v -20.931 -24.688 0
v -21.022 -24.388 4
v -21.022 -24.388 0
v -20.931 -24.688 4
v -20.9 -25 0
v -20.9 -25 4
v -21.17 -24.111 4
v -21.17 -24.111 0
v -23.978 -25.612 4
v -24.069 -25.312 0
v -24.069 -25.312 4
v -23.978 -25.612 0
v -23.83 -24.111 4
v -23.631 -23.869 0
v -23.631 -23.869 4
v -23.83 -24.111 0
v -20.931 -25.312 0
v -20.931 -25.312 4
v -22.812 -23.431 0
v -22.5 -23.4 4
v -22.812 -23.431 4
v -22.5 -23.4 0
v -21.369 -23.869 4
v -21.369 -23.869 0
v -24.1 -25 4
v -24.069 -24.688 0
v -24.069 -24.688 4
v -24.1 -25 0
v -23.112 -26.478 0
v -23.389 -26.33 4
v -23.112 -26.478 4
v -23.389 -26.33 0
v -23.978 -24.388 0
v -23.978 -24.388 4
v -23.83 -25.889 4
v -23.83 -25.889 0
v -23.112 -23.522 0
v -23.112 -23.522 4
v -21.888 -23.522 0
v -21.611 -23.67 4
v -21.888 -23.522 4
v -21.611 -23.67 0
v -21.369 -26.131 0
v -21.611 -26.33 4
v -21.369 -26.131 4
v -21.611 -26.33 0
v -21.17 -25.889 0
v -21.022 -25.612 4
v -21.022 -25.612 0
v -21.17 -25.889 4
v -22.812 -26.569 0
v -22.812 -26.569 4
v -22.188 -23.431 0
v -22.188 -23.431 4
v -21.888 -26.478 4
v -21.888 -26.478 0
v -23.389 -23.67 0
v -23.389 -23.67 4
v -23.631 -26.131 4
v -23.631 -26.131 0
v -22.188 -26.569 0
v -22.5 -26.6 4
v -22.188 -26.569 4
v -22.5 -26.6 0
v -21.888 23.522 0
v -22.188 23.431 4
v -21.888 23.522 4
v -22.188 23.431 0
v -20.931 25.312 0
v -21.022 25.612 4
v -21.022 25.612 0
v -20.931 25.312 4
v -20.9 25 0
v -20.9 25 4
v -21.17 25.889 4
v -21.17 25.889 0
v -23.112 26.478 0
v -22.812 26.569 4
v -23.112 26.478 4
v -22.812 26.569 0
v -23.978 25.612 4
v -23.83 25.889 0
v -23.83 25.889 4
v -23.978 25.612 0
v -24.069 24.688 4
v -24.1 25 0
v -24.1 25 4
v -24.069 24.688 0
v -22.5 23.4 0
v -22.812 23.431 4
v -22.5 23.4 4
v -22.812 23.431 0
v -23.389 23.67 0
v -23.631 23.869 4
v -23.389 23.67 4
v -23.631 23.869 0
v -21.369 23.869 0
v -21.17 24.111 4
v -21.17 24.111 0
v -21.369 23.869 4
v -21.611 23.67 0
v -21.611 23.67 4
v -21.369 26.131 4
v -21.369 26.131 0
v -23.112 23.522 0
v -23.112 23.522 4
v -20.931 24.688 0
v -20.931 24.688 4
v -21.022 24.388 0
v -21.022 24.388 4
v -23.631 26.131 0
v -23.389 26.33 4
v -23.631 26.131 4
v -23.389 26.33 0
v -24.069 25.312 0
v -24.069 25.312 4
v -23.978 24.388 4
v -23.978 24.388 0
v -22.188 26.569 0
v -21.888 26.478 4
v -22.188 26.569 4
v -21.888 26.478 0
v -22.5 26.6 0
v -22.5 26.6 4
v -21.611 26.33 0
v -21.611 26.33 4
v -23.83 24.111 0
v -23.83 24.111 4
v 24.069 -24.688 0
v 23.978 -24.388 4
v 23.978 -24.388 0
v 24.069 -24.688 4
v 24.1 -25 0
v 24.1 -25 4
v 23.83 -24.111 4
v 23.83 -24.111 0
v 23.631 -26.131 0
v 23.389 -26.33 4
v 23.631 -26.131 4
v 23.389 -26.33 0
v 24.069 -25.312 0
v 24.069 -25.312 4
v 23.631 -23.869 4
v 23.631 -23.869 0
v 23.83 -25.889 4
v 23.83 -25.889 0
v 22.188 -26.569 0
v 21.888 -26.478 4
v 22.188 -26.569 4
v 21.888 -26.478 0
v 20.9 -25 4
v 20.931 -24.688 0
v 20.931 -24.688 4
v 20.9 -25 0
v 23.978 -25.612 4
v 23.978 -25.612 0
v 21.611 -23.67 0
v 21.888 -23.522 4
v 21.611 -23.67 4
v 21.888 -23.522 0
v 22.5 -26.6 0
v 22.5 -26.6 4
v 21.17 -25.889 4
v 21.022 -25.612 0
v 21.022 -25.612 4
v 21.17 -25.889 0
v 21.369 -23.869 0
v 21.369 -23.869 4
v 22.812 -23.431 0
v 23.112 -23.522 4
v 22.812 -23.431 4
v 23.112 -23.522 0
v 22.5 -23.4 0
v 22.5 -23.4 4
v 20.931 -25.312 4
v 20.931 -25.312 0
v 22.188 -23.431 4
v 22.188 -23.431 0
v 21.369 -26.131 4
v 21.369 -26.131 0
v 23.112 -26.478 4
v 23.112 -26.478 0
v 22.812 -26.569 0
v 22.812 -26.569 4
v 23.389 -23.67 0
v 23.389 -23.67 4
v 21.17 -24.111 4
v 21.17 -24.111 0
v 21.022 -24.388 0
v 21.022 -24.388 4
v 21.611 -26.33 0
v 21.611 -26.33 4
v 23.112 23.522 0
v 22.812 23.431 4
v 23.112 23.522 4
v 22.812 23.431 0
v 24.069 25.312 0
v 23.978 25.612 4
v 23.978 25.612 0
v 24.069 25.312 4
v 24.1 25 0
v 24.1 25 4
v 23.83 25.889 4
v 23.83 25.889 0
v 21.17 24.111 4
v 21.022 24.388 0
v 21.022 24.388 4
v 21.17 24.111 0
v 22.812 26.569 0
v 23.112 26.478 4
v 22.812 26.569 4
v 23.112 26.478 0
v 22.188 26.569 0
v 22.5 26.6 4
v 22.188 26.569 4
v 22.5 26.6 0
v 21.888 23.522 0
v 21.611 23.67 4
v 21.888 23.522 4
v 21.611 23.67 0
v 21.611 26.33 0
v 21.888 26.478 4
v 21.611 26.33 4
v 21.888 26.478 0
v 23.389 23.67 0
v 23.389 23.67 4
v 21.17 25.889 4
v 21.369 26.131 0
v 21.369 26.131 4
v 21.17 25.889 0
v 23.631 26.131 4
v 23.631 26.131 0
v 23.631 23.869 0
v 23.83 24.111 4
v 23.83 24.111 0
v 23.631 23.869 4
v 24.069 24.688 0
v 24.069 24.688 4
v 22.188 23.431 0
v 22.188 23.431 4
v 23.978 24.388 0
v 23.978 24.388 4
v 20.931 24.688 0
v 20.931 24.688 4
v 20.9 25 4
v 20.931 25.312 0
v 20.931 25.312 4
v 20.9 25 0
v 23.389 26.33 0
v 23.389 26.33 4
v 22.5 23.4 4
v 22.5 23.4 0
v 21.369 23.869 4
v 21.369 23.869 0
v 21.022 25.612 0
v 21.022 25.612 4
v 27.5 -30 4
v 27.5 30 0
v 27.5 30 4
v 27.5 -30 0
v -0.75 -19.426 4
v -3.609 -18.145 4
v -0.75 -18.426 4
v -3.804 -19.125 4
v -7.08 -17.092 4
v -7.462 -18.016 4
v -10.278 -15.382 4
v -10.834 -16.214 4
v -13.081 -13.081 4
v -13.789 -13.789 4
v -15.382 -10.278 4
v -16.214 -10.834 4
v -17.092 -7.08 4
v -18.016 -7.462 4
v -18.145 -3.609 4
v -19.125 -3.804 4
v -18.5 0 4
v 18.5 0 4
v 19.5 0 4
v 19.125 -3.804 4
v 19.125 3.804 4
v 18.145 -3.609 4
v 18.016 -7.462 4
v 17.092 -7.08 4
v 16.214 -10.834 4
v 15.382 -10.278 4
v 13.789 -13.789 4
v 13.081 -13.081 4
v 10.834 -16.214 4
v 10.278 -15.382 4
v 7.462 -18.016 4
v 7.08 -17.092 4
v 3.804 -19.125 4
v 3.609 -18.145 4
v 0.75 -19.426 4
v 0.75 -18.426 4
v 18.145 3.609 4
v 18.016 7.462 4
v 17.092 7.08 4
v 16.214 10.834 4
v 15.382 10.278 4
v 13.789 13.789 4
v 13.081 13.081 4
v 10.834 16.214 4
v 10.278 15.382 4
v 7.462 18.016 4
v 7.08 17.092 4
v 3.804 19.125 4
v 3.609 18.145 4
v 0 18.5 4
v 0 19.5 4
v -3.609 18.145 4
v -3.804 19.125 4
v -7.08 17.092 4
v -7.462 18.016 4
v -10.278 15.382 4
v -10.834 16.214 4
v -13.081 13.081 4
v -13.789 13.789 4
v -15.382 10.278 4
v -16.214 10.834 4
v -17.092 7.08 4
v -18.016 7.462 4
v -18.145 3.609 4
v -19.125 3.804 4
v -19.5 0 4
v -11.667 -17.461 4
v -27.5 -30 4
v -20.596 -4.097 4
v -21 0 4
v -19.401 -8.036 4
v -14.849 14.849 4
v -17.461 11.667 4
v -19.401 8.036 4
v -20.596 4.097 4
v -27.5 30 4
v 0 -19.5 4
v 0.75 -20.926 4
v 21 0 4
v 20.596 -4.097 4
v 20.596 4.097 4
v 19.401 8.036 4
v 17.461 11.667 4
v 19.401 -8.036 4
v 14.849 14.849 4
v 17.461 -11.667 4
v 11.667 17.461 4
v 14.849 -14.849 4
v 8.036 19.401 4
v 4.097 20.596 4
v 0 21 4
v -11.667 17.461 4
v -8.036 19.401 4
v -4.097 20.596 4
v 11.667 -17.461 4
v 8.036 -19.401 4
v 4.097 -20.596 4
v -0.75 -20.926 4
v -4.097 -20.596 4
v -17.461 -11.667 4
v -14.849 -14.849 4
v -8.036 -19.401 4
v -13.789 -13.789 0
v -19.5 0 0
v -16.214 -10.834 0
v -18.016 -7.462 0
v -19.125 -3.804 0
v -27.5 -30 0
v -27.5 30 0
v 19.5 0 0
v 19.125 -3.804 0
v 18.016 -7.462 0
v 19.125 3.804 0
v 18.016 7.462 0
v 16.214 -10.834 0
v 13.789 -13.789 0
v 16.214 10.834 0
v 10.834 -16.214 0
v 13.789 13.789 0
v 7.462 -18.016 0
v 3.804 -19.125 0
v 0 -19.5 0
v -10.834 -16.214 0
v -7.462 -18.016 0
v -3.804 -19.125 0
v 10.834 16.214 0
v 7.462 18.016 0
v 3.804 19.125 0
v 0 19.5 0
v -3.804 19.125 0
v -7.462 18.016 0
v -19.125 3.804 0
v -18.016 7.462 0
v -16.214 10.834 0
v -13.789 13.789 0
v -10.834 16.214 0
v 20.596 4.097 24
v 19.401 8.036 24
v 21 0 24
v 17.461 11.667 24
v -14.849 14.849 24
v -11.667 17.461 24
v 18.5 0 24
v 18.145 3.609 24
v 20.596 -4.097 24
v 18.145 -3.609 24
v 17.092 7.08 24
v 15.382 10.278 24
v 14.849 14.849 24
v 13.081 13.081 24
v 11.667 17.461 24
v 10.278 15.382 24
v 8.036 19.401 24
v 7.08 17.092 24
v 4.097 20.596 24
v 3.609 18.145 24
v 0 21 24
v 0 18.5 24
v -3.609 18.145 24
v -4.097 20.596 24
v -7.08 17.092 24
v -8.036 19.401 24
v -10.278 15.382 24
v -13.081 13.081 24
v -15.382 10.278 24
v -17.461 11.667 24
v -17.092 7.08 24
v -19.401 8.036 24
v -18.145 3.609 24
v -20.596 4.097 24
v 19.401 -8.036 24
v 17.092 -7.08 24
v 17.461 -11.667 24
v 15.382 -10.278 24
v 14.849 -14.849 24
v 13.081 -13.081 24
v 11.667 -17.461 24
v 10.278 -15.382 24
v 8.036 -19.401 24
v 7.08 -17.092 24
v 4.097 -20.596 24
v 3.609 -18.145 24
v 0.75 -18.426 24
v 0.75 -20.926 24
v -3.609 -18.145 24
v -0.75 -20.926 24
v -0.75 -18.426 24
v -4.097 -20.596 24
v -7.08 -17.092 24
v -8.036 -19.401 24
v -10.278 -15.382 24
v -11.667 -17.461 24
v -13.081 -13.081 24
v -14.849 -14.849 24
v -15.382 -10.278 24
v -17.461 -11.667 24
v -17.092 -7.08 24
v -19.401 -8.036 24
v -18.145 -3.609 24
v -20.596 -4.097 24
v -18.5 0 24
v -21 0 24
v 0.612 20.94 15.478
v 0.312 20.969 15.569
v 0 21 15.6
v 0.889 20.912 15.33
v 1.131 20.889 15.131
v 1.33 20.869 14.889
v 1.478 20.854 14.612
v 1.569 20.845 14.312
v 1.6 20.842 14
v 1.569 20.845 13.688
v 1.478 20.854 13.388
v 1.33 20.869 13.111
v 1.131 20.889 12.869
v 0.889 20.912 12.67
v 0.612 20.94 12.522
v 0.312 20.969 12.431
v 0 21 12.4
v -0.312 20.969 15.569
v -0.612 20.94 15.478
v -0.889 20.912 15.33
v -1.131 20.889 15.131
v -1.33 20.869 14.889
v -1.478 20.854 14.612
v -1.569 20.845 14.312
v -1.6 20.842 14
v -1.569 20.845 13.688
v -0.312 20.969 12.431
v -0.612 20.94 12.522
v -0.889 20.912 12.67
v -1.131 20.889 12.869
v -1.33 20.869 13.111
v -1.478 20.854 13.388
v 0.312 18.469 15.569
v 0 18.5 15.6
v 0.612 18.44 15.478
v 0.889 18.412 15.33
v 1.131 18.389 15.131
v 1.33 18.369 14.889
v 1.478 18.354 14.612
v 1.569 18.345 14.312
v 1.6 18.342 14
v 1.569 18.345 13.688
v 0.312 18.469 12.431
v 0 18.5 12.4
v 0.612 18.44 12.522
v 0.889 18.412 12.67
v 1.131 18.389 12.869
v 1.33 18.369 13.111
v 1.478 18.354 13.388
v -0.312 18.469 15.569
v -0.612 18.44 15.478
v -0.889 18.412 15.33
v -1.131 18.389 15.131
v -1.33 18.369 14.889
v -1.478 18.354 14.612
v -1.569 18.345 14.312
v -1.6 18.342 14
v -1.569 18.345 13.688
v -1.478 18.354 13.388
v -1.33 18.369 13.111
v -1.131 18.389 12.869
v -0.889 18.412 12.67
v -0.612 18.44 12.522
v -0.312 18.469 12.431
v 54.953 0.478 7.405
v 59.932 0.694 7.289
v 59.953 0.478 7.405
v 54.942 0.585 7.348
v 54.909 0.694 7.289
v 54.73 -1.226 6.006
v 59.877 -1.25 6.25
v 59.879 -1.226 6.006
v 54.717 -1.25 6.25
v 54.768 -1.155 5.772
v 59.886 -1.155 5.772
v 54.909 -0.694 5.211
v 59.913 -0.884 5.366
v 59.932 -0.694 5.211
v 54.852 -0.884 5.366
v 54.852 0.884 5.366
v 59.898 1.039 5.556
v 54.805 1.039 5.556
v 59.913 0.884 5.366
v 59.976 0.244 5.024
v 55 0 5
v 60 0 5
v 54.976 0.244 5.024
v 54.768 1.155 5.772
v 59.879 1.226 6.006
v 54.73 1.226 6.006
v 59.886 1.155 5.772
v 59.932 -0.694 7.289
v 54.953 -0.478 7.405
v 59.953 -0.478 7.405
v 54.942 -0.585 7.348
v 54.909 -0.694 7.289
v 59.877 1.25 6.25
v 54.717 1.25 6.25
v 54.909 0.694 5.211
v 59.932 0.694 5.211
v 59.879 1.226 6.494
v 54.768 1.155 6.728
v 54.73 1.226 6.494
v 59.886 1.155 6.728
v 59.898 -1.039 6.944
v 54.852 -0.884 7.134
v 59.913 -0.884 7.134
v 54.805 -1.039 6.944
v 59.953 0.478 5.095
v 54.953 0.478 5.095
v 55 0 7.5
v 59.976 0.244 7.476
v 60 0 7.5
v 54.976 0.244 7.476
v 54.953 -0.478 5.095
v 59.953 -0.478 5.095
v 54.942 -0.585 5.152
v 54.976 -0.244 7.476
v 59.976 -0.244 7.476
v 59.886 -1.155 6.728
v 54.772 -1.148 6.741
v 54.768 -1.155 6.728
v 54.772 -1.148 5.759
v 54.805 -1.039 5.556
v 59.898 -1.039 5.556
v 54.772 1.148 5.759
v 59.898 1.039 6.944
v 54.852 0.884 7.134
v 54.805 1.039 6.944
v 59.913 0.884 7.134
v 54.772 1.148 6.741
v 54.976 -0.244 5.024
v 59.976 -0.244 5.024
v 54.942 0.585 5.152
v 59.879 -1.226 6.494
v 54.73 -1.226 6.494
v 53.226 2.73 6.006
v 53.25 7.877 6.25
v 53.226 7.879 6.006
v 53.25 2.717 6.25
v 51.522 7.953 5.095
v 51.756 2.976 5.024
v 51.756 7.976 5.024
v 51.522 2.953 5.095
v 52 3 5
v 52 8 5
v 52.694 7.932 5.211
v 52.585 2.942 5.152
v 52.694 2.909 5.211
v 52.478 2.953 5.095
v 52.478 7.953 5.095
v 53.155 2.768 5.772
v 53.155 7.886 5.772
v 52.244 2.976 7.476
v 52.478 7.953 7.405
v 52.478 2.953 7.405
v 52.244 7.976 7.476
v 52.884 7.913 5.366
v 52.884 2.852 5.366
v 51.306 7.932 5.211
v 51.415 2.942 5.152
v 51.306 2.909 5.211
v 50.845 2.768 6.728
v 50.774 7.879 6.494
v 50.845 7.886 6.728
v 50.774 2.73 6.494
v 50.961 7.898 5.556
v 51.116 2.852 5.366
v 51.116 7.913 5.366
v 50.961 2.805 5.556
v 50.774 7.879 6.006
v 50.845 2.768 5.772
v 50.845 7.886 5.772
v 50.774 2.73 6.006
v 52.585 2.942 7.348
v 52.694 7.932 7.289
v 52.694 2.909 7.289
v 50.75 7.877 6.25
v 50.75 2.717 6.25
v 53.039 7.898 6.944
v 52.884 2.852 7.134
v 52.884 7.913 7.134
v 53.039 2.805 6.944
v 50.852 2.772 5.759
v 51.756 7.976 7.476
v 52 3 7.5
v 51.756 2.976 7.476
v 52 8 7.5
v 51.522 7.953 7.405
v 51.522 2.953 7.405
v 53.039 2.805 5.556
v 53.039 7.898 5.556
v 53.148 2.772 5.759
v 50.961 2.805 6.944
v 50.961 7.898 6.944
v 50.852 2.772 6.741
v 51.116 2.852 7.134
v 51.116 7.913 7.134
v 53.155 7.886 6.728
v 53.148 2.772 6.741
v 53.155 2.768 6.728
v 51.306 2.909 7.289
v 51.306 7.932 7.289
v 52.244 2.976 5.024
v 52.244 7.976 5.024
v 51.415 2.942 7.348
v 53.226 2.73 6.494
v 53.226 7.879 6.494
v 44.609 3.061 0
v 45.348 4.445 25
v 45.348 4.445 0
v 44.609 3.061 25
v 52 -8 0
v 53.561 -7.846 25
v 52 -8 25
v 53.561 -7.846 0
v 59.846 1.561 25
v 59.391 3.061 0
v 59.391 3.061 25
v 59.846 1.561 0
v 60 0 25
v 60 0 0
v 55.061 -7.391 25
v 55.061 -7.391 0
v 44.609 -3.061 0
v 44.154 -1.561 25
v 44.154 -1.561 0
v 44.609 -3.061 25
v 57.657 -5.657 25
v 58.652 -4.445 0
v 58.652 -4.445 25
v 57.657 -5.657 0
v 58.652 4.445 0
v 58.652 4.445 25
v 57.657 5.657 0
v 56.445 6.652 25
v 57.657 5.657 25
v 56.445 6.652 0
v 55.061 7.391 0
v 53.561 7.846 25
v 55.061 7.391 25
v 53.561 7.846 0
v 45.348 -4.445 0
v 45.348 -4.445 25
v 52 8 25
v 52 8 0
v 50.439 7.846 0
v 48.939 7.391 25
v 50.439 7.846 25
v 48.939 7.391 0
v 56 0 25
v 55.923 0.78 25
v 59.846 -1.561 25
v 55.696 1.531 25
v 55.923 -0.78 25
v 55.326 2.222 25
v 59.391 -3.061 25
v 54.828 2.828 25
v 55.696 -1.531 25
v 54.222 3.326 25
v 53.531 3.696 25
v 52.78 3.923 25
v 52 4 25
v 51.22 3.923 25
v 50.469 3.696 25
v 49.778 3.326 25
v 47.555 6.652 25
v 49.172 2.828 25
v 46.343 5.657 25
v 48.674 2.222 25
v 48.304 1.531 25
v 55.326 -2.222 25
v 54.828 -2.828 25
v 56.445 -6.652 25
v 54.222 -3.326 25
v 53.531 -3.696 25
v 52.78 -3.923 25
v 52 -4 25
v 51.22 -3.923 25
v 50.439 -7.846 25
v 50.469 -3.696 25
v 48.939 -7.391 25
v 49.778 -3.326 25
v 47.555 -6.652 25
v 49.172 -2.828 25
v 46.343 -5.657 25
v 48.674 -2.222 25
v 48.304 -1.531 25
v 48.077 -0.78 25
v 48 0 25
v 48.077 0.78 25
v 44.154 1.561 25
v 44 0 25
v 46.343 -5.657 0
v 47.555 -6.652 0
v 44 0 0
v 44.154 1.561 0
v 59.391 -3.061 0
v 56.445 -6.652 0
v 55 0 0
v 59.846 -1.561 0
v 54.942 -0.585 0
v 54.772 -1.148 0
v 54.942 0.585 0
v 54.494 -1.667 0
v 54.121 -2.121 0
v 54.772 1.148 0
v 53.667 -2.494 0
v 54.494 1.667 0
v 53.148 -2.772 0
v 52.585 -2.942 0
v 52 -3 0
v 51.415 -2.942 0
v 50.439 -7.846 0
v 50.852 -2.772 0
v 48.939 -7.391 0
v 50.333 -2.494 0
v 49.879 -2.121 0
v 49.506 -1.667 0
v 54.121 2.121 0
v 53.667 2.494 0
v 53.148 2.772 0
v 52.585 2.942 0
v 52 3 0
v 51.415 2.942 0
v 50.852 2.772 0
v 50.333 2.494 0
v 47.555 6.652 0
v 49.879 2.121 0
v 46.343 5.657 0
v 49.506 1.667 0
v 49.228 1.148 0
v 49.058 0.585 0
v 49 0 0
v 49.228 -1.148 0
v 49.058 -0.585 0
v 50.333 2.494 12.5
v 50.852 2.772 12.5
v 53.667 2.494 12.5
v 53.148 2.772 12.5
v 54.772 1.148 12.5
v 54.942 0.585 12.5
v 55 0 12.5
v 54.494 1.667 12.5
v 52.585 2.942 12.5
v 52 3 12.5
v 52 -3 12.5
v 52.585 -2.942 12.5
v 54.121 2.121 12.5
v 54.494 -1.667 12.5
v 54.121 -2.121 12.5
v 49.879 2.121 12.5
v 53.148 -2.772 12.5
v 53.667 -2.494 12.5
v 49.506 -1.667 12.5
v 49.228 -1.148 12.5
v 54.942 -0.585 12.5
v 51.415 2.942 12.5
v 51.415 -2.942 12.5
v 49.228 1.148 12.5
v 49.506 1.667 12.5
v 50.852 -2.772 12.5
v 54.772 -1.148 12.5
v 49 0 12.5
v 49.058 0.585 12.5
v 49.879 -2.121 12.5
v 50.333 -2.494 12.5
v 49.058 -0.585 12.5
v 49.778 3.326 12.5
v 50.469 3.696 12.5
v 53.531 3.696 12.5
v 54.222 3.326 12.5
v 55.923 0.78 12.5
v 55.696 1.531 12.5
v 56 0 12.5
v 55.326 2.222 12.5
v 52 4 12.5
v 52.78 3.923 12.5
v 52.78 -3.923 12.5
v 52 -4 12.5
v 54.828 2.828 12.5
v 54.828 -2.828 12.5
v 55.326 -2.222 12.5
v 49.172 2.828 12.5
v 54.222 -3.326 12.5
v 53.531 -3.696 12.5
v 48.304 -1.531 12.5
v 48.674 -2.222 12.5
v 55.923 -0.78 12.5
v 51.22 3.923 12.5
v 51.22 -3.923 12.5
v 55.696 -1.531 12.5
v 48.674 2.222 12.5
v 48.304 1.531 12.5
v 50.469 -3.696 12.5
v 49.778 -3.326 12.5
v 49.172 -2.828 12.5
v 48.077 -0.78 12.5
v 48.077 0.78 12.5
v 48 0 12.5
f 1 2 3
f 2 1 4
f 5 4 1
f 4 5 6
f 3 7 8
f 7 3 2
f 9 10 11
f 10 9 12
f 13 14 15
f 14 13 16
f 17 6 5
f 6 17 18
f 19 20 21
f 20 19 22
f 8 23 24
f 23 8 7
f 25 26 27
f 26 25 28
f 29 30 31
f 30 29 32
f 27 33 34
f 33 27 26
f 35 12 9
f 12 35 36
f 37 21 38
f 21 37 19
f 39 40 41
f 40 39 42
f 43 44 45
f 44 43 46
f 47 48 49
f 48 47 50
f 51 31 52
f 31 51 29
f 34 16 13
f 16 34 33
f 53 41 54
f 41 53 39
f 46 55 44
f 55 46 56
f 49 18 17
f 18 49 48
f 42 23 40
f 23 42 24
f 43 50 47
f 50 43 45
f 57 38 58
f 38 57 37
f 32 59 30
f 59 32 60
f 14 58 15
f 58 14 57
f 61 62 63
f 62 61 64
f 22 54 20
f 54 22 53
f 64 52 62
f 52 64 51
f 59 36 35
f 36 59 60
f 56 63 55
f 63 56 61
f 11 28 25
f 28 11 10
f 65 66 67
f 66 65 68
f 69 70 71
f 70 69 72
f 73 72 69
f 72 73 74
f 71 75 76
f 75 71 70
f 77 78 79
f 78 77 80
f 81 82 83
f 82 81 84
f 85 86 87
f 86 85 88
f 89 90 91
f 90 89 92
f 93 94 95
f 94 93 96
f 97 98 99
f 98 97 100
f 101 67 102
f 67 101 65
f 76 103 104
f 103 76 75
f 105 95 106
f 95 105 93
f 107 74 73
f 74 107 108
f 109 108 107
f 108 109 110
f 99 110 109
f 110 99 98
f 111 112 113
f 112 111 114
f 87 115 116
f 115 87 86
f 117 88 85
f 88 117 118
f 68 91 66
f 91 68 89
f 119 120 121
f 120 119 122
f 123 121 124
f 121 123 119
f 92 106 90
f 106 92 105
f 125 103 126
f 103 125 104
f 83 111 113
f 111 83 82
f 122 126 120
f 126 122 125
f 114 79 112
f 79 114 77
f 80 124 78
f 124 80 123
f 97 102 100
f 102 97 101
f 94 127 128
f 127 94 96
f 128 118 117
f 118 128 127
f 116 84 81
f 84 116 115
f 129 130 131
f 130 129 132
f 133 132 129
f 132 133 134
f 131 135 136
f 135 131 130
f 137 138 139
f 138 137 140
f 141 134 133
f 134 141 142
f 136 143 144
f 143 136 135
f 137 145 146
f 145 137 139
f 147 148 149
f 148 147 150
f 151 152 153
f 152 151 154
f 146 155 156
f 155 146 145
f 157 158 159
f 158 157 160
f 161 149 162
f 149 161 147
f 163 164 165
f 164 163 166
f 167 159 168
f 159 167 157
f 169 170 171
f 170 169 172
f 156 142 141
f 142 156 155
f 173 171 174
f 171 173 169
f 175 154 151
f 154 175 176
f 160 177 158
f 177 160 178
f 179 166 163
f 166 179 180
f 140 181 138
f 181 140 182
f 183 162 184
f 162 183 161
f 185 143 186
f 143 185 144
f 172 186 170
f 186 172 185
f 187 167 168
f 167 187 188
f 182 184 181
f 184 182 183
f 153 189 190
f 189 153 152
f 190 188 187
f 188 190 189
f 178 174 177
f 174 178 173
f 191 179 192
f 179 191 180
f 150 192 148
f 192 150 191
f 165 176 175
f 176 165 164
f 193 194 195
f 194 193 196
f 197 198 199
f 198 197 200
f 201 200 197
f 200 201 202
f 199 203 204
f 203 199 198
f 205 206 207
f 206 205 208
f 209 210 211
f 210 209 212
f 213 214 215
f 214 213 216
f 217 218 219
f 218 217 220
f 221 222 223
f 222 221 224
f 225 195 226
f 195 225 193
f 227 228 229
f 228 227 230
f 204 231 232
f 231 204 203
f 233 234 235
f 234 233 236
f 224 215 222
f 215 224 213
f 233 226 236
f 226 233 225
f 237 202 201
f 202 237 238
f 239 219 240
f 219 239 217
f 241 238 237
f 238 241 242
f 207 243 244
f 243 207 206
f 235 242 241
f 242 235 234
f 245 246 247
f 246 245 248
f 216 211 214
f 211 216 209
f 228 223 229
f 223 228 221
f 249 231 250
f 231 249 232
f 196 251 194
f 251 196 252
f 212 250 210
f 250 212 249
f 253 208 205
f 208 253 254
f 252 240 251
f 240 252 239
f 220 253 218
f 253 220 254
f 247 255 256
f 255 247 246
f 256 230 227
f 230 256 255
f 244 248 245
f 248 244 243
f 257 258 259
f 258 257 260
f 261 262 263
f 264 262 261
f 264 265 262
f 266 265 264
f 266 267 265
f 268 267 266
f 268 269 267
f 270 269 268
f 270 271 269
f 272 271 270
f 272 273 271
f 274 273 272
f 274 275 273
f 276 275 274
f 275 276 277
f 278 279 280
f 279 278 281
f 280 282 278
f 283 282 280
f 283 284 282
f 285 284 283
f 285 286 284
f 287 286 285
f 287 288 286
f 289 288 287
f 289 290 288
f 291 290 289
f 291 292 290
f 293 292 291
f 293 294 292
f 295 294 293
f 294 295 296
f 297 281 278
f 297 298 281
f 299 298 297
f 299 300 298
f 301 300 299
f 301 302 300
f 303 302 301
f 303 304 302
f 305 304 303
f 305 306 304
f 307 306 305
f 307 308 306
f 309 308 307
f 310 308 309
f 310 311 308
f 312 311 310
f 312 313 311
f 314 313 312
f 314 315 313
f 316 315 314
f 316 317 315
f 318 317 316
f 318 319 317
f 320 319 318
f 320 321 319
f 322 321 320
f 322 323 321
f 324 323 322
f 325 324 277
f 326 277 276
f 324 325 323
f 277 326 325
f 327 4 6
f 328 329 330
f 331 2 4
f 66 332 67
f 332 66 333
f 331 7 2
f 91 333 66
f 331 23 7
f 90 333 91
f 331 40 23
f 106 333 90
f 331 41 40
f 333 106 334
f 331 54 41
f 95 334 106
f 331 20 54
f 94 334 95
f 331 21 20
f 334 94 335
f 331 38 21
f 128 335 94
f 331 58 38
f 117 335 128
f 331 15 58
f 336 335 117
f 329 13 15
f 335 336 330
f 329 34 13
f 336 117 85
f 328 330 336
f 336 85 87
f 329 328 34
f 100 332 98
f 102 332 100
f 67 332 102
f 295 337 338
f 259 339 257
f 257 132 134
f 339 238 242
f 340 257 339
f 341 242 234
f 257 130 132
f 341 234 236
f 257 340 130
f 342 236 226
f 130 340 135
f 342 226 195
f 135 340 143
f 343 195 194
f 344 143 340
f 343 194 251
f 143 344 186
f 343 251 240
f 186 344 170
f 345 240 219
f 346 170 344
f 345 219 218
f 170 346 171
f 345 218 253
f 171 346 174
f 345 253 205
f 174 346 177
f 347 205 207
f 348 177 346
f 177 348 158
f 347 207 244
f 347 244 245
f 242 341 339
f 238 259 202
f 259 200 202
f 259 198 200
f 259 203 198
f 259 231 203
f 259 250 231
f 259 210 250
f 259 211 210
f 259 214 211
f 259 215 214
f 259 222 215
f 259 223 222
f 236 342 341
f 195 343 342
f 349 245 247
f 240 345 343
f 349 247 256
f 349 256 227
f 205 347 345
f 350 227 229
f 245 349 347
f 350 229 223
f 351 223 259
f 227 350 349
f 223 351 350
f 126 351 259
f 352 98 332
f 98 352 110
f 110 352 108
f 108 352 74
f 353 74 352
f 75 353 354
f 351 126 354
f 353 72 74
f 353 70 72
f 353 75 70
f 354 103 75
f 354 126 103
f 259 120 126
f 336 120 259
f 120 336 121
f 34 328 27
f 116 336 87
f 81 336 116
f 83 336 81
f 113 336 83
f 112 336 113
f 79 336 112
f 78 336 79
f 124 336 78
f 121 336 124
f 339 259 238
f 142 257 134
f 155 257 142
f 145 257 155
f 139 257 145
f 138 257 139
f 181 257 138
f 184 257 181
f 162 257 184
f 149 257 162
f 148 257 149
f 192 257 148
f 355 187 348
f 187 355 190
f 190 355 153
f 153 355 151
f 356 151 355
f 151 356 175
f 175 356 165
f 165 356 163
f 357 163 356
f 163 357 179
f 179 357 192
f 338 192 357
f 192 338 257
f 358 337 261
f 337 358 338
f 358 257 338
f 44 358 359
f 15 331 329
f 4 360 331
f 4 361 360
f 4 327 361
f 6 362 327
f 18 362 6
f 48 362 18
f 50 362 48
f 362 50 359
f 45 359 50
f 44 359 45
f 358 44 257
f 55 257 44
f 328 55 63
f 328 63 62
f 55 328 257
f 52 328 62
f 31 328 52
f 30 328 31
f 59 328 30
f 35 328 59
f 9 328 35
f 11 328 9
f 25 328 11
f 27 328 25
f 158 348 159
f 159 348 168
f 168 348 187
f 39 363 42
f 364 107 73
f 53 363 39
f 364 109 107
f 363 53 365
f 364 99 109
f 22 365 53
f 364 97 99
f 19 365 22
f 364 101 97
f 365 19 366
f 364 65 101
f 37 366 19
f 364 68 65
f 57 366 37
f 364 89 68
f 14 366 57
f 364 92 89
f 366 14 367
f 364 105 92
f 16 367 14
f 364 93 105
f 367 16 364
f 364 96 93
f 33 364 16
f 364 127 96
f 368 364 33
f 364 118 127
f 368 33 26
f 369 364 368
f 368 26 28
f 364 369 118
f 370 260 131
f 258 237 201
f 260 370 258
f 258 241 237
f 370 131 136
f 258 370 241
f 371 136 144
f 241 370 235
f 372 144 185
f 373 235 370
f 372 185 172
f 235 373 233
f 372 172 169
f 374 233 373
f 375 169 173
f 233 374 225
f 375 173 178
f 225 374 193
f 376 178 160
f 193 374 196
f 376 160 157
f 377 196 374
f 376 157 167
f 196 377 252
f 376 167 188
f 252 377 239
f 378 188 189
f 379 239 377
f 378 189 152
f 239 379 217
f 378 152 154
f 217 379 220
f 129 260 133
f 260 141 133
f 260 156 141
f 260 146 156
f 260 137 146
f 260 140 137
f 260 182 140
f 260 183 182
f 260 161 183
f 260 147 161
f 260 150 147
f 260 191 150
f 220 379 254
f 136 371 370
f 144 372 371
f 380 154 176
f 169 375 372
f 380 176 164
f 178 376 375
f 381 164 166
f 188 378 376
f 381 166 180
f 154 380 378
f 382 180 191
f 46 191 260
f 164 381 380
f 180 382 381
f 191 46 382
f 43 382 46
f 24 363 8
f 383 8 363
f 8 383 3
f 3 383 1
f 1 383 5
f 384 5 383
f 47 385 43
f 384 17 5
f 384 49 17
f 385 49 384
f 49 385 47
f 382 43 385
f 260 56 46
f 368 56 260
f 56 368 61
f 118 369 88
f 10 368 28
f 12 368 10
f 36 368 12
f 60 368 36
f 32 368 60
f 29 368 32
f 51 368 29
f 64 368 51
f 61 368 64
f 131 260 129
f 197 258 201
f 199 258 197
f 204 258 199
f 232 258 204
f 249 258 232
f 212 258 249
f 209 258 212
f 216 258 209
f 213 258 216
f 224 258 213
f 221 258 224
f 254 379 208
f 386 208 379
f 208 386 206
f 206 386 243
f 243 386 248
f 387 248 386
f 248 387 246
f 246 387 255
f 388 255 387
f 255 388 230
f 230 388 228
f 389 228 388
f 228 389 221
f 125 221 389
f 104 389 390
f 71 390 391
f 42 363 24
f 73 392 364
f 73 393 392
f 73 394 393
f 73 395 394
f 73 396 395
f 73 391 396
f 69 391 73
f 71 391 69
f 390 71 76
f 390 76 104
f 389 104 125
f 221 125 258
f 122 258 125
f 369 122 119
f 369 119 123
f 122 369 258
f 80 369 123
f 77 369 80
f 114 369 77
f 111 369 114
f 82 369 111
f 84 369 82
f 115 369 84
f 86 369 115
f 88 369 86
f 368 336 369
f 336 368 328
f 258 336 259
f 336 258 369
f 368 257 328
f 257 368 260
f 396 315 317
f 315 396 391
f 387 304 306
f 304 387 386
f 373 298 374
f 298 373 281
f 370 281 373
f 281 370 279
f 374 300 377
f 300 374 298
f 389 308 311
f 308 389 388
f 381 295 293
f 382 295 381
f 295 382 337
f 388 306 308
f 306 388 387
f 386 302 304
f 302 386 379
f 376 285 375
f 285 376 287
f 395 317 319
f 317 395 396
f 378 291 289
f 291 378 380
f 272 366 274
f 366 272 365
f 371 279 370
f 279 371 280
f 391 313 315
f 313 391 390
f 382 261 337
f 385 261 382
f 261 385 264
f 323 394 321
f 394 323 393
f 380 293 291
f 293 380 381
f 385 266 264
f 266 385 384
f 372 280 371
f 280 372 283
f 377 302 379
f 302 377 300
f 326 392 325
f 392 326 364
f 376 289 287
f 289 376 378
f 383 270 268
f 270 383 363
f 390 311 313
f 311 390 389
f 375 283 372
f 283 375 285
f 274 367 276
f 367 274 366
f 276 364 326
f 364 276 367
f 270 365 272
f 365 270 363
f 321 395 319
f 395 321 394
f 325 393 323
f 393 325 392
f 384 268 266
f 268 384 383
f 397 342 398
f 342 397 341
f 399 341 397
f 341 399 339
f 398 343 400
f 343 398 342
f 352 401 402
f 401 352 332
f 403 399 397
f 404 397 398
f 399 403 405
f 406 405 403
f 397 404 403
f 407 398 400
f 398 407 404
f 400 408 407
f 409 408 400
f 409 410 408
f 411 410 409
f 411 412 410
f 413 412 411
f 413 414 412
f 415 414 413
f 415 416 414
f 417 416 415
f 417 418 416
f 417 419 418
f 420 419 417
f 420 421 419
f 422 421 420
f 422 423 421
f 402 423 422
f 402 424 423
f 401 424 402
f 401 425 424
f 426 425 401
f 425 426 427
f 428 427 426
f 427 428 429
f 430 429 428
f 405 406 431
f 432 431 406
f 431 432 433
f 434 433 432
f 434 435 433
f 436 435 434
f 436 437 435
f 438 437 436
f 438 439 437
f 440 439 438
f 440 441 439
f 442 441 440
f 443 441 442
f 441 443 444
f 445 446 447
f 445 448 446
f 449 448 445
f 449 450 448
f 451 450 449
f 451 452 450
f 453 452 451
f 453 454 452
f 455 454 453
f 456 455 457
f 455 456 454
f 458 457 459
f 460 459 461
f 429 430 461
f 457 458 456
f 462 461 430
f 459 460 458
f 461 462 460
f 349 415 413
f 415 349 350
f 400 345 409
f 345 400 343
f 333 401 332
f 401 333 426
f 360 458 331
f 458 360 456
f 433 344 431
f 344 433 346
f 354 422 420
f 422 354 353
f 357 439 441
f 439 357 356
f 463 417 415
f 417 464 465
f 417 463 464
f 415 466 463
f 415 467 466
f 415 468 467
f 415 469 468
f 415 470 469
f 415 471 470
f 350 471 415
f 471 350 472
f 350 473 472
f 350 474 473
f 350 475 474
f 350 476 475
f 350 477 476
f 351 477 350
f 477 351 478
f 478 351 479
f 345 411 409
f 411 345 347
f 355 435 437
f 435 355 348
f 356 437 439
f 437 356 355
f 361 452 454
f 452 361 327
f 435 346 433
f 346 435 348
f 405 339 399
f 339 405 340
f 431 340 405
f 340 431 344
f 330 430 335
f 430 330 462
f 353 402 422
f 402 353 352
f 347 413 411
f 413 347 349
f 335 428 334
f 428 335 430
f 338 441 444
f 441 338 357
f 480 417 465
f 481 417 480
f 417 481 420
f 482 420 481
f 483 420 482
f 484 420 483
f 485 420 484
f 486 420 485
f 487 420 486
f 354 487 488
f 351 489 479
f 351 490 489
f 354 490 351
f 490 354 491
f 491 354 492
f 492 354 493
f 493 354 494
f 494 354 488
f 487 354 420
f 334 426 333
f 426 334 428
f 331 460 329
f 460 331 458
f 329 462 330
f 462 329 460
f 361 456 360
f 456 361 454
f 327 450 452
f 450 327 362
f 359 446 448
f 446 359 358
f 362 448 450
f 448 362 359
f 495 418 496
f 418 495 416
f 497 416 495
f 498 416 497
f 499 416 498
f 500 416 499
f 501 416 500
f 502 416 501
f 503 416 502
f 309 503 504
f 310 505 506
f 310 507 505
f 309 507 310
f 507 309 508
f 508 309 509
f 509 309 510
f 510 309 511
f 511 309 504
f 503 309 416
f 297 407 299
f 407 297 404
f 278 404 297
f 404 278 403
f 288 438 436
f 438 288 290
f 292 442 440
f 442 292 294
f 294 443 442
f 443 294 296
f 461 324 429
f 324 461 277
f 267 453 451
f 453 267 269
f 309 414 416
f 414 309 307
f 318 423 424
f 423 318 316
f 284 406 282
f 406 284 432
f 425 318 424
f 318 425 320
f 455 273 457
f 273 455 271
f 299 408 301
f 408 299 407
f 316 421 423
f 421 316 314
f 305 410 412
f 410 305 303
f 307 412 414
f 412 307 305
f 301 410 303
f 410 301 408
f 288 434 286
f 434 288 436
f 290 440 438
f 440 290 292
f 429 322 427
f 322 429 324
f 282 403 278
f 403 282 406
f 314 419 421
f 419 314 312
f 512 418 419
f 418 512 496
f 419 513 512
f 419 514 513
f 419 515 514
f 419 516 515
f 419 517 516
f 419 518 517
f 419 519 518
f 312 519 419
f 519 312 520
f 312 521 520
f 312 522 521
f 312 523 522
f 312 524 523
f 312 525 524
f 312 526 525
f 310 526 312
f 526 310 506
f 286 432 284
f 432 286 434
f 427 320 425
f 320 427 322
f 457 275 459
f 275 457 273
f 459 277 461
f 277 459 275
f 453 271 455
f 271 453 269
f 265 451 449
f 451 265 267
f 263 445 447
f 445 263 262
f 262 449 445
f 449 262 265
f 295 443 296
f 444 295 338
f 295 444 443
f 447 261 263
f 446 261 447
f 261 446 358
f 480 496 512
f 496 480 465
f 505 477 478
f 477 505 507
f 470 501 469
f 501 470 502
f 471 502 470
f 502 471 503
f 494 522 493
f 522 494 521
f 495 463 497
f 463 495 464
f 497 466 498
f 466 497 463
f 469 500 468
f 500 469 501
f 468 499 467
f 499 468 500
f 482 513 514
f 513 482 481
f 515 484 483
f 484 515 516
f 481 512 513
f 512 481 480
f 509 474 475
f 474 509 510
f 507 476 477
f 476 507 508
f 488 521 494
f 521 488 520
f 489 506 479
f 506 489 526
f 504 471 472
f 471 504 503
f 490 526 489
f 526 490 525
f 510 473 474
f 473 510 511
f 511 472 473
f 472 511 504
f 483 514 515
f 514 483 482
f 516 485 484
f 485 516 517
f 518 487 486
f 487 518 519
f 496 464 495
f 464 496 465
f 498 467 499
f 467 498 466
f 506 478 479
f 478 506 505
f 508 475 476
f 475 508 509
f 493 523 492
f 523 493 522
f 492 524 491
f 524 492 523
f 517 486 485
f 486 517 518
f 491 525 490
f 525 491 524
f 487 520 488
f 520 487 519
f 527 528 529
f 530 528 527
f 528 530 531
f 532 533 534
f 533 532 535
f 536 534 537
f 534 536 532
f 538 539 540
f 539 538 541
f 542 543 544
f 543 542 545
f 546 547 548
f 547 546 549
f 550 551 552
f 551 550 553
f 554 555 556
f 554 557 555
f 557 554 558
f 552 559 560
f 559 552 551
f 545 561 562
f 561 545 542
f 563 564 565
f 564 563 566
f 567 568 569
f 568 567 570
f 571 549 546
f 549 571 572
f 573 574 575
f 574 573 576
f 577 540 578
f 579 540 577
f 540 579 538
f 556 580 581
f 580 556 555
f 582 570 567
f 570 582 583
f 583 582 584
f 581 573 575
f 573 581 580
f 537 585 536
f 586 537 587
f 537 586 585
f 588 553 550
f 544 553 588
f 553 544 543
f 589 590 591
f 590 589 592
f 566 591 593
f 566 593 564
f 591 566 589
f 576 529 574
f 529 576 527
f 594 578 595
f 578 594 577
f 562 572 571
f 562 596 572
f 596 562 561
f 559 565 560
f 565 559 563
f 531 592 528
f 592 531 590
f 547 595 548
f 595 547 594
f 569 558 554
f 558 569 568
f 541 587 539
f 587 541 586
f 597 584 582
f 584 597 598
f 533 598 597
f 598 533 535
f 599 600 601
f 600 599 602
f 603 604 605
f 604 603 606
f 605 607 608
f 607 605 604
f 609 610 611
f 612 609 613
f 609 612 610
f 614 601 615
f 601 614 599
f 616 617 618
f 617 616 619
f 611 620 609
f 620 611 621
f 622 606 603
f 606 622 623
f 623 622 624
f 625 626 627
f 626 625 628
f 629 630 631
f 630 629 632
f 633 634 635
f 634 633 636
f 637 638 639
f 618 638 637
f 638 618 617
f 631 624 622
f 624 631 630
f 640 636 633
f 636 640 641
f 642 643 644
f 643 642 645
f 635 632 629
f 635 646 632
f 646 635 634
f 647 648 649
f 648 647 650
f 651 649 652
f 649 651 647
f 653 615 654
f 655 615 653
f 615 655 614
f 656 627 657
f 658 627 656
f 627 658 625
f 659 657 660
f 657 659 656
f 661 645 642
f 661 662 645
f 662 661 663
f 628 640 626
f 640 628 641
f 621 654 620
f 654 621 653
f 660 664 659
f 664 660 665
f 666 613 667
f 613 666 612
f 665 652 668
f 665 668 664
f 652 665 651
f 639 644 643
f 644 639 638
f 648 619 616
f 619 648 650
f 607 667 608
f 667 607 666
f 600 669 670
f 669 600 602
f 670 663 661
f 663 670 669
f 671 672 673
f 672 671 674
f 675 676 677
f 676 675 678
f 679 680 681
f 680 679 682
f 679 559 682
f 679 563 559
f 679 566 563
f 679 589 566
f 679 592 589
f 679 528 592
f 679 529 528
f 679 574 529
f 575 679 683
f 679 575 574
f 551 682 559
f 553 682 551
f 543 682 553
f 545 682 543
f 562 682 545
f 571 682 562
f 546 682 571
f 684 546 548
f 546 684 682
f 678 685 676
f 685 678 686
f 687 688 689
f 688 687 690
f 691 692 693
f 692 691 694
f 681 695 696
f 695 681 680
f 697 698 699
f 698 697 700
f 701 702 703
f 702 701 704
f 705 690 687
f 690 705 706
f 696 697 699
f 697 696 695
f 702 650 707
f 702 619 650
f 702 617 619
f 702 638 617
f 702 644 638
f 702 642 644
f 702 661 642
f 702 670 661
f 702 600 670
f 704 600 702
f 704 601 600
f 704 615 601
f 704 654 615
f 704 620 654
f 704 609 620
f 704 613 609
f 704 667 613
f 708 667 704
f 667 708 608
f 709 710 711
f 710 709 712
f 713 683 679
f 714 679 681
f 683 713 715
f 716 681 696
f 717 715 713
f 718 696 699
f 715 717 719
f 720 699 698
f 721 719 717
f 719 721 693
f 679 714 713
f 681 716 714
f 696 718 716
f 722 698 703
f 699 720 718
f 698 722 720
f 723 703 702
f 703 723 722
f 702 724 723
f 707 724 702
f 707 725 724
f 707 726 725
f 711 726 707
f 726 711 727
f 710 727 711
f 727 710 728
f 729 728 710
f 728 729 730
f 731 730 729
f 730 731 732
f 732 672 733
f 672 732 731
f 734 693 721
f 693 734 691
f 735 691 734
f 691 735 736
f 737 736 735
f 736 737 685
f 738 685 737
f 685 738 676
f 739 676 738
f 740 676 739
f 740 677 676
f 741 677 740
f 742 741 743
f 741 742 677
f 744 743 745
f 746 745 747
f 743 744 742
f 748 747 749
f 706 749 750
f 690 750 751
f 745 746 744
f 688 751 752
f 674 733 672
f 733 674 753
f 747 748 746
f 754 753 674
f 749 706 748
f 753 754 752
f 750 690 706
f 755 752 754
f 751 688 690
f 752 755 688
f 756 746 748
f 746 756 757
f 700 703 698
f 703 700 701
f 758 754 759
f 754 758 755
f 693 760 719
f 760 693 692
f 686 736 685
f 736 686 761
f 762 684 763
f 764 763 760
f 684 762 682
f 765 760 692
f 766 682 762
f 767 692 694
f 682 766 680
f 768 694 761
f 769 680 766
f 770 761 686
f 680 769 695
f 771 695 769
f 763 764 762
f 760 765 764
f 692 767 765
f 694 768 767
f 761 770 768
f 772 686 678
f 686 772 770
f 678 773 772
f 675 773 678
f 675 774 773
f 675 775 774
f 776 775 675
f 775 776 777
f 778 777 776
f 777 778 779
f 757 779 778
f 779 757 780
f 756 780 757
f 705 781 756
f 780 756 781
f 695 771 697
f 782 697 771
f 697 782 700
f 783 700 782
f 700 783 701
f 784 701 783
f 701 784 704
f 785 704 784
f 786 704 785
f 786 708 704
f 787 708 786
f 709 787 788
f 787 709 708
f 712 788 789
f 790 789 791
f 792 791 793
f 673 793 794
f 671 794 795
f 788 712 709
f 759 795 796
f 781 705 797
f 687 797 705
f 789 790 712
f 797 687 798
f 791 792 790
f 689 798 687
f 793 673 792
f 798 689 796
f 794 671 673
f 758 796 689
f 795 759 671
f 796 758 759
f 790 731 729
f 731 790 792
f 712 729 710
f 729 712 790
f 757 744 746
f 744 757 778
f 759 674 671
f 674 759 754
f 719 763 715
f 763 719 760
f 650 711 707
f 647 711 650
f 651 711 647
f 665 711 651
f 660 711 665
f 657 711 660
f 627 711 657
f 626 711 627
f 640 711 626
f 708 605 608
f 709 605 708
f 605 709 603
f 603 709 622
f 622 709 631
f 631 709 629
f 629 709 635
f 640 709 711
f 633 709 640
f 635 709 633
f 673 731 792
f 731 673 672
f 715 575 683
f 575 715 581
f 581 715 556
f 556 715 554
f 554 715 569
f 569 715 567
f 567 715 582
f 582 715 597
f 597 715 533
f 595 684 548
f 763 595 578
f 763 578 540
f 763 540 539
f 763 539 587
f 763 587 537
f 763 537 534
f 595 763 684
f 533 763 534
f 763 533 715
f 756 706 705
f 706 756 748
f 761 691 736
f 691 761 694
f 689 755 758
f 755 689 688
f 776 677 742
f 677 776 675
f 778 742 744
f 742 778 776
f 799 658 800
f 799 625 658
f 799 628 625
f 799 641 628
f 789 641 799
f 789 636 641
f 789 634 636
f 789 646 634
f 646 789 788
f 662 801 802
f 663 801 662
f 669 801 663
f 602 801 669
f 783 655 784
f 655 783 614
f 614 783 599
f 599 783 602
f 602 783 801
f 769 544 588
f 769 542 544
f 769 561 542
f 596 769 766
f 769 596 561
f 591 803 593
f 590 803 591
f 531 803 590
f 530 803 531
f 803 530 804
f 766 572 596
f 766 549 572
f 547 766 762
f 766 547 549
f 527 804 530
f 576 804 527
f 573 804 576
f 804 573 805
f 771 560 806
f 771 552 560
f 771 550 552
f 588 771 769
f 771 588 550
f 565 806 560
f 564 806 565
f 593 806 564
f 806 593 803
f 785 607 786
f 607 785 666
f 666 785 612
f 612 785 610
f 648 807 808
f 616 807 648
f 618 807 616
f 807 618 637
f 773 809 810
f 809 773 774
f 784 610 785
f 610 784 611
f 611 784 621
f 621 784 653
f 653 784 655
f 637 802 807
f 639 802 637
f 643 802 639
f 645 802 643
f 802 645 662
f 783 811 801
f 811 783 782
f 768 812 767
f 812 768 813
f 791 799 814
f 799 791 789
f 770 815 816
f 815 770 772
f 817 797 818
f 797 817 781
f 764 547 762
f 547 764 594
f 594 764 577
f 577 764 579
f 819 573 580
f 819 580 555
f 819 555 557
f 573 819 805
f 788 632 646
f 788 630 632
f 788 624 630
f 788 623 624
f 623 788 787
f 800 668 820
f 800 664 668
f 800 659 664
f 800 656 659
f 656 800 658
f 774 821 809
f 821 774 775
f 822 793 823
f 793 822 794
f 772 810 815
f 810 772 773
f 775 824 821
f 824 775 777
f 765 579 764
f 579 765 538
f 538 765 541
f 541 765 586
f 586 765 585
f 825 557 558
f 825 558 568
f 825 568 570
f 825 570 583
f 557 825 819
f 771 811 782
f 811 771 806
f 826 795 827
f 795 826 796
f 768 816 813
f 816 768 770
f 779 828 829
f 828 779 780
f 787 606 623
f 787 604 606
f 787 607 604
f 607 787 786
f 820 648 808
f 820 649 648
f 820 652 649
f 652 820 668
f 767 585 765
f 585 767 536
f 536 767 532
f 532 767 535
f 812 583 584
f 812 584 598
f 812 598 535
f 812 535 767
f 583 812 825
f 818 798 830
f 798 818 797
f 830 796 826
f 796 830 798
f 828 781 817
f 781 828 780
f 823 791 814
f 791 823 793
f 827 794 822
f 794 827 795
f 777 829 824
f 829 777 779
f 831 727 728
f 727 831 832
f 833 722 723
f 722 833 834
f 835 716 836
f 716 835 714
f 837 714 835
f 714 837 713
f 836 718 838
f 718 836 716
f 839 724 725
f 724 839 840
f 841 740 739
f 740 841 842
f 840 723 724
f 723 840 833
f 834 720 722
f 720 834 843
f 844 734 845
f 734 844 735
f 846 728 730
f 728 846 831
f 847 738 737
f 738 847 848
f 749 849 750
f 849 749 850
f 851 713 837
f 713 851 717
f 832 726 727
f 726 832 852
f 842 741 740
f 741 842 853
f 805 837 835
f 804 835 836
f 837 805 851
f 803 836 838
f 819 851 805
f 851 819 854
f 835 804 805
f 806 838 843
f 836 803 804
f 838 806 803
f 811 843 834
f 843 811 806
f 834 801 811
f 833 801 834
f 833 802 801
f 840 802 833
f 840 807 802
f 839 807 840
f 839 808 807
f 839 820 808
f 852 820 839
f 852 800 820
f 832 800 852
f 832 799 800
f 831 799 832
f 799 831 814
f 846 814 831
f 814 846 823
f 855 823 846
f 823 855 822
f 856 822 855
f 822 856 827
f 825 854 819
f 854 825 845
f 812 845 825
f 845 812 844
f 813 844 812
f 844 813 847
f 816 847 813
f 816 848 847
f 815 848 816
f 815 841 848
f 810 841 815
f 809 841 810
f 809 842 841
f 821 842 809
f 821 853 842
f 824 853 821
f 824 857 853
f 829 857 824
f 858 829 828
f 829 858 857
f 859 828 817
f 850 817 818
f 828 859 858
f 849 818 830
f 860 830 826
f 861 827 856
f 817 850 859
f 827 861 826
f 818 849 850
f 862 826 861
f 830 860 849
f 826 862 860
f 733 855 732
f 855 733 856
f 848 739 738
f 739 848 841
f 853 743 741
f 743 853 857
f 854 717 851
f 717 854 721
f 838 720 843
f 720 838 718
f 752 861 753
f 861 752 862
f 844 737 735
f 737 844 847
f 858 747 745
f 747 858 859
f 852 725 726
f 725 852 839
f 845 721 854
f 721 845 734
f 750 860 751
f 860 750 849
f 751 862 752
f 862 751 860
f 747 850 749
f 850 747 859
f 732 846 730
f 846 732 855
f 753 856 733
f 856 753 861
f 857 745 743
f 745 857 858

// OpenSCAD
// ============================================================
// motor_bracket.scad
// DC Motor Mounting Bracket for Humanoid Welcoming Robot
// Flanged motor mount + shaft coupler for 12V/24V geared motors
//
// Print Settings:
//   Material:    PLA
//   Infill:      70%
//   Layer height: 0.2 mm
//   Supports:    None required
//   Weight:      ~8 g (need 2)
//   Print time:  ~5 minutes each
// ============================================================

$fn = 32;
$fa = 6;
$fs = 1;

// --- Parametric Variables ---
motor_diameter         = 37;   // mm  standard motor can
motor_length           = 45;   // mm  motor body length
motor_shaft_diameter   = 6;    // mm  motor output shaft
wheel_bore             = 8;    // mm  wheel hub bore
mounting_hole_diameter = 3.2;  // mm  M3 screws to base
wall_thickness         = 2.5;  // mm  bracket wall thickness
flange_thickness       = 4.0;  // mm  mounting flange thickness
flange_width           = 55;   // mm  flange width (bolt pattern)
flange_height          = 60;   // mm  flange height (bolt pattern)
bolt_inset             = 5;    // mm  bolt hole distance from edge

// Derived
motor_radius    = motor_diameter / 2;
collar_od       = motor_diameter + 2 * wall_thickness;
collar_height   = 20;   // grip length on motor body

// ============================================================
// Module: motor_collar
// Cylindrical clamp around motor body
// ============================================================
module motor_collar() {
    split_gap = 1.5;   // mm  clamp gap
    difference() {
        cylinder(d = collar_od, h = collar_height);
        // Motor bore
        translate([0, 0, -0.1])
            cylinder(d = motor_diameter, h = collar_height + 0.2);
        // Clamp split slot
        translate([-split_gap / 2, -collar_od / 2 - 0.1, -0.1])
            cube([split_gap, collar_od / 2 + 0.2, collar_height + 0.2]);
        // Clamp screw hole (M3, across split)
        translate([0, collar_od / 2, collar_height / 2])
            rotate([90, 0, 0])
                cylinder(d = mounting_hole_diameter,
                         h = collar_od + 0.2, center = true);
    }
}

// ============================================================
// Module: mounting_flange
// Flat plate with bolt holes that bolts to GI base frame
// ============================================================
module mounting_flange() {
    difference() {
        translate([-flange_width / 2, -flange_height / 2, 0])
            cube([flange_width, flange_height, flange_thickness]);
        // 4× corner bolt holes
        for (sx = [-1, 1])
            for (sy = [-1, 1])
                translate([sx * (flange_width / 2 - bolt_inset),
                           sy * (flange_height / 2 - bolt_inset),
                           -0.1])
                    cylinder(d = mounting_hole_diameter,
                             h = flange_thickness + 0.2);
        // Central hole for shaft clearance
        translate([0, 0, -0.1])
            cylinder(d = motor_diameter + 2, h = flange_thickness + 0.2);
    }
}

// ============================================================
// Module: shaft_coupler
// Adapts 6 mm motor shaft to 8 mm wheel hub bore
// ============================================================
module shaft_coupler() {
    coupler_od     = 16;
    coupler_length = 25;
    set_screw_d    = 2.5;  // M2.5 set screw
    difference() {
        cylinder(d = coupler_od, h = coupler_length);
        // Motor shaft bore (6 mm)
        translate([0, 0, -0.1])
            cylinder(d = motor_shaft_diameter, h = coupler_length * 0.6 + 0.1);
        // Wheel hub bore (8 mm, other end)
        translate([0, 0, coupler_length * 0.5])
            cylinder(d = wheel_bore, h = coupler_length * 0.5 + 0.1);
        // Set screw holes (2× perpendicular)
        for (a = [0, 90])
            rotate([0, 0, a])
                translate([coupler_od / 2, 0, coupler_length * 0.25])
                    rotate([0, 90, 0])
                        cylinder(d = set_screw_d,
                                 h = coupler_od + 0.2, center = true);
    }
}

// ============================================================
// Module: motor_bracket
// Complete bracket assembly
// ============================================================
module motor_bracket() {
    // Mounting flange (bolts to base)
    mounting_flange();
    // Motor collar (rises from flange)
    translate([0, 0, flange_thickness])
        motor_collar();
}

// ============================================================
// Render  (bracket + separate coupler shown side by side)
// ============================================================
color("SteelBlue")
    motor_bracket();
color("LightSlateGray")
    translate([motor_diameter + 15, 0, 0])
        shaft_coupler();
